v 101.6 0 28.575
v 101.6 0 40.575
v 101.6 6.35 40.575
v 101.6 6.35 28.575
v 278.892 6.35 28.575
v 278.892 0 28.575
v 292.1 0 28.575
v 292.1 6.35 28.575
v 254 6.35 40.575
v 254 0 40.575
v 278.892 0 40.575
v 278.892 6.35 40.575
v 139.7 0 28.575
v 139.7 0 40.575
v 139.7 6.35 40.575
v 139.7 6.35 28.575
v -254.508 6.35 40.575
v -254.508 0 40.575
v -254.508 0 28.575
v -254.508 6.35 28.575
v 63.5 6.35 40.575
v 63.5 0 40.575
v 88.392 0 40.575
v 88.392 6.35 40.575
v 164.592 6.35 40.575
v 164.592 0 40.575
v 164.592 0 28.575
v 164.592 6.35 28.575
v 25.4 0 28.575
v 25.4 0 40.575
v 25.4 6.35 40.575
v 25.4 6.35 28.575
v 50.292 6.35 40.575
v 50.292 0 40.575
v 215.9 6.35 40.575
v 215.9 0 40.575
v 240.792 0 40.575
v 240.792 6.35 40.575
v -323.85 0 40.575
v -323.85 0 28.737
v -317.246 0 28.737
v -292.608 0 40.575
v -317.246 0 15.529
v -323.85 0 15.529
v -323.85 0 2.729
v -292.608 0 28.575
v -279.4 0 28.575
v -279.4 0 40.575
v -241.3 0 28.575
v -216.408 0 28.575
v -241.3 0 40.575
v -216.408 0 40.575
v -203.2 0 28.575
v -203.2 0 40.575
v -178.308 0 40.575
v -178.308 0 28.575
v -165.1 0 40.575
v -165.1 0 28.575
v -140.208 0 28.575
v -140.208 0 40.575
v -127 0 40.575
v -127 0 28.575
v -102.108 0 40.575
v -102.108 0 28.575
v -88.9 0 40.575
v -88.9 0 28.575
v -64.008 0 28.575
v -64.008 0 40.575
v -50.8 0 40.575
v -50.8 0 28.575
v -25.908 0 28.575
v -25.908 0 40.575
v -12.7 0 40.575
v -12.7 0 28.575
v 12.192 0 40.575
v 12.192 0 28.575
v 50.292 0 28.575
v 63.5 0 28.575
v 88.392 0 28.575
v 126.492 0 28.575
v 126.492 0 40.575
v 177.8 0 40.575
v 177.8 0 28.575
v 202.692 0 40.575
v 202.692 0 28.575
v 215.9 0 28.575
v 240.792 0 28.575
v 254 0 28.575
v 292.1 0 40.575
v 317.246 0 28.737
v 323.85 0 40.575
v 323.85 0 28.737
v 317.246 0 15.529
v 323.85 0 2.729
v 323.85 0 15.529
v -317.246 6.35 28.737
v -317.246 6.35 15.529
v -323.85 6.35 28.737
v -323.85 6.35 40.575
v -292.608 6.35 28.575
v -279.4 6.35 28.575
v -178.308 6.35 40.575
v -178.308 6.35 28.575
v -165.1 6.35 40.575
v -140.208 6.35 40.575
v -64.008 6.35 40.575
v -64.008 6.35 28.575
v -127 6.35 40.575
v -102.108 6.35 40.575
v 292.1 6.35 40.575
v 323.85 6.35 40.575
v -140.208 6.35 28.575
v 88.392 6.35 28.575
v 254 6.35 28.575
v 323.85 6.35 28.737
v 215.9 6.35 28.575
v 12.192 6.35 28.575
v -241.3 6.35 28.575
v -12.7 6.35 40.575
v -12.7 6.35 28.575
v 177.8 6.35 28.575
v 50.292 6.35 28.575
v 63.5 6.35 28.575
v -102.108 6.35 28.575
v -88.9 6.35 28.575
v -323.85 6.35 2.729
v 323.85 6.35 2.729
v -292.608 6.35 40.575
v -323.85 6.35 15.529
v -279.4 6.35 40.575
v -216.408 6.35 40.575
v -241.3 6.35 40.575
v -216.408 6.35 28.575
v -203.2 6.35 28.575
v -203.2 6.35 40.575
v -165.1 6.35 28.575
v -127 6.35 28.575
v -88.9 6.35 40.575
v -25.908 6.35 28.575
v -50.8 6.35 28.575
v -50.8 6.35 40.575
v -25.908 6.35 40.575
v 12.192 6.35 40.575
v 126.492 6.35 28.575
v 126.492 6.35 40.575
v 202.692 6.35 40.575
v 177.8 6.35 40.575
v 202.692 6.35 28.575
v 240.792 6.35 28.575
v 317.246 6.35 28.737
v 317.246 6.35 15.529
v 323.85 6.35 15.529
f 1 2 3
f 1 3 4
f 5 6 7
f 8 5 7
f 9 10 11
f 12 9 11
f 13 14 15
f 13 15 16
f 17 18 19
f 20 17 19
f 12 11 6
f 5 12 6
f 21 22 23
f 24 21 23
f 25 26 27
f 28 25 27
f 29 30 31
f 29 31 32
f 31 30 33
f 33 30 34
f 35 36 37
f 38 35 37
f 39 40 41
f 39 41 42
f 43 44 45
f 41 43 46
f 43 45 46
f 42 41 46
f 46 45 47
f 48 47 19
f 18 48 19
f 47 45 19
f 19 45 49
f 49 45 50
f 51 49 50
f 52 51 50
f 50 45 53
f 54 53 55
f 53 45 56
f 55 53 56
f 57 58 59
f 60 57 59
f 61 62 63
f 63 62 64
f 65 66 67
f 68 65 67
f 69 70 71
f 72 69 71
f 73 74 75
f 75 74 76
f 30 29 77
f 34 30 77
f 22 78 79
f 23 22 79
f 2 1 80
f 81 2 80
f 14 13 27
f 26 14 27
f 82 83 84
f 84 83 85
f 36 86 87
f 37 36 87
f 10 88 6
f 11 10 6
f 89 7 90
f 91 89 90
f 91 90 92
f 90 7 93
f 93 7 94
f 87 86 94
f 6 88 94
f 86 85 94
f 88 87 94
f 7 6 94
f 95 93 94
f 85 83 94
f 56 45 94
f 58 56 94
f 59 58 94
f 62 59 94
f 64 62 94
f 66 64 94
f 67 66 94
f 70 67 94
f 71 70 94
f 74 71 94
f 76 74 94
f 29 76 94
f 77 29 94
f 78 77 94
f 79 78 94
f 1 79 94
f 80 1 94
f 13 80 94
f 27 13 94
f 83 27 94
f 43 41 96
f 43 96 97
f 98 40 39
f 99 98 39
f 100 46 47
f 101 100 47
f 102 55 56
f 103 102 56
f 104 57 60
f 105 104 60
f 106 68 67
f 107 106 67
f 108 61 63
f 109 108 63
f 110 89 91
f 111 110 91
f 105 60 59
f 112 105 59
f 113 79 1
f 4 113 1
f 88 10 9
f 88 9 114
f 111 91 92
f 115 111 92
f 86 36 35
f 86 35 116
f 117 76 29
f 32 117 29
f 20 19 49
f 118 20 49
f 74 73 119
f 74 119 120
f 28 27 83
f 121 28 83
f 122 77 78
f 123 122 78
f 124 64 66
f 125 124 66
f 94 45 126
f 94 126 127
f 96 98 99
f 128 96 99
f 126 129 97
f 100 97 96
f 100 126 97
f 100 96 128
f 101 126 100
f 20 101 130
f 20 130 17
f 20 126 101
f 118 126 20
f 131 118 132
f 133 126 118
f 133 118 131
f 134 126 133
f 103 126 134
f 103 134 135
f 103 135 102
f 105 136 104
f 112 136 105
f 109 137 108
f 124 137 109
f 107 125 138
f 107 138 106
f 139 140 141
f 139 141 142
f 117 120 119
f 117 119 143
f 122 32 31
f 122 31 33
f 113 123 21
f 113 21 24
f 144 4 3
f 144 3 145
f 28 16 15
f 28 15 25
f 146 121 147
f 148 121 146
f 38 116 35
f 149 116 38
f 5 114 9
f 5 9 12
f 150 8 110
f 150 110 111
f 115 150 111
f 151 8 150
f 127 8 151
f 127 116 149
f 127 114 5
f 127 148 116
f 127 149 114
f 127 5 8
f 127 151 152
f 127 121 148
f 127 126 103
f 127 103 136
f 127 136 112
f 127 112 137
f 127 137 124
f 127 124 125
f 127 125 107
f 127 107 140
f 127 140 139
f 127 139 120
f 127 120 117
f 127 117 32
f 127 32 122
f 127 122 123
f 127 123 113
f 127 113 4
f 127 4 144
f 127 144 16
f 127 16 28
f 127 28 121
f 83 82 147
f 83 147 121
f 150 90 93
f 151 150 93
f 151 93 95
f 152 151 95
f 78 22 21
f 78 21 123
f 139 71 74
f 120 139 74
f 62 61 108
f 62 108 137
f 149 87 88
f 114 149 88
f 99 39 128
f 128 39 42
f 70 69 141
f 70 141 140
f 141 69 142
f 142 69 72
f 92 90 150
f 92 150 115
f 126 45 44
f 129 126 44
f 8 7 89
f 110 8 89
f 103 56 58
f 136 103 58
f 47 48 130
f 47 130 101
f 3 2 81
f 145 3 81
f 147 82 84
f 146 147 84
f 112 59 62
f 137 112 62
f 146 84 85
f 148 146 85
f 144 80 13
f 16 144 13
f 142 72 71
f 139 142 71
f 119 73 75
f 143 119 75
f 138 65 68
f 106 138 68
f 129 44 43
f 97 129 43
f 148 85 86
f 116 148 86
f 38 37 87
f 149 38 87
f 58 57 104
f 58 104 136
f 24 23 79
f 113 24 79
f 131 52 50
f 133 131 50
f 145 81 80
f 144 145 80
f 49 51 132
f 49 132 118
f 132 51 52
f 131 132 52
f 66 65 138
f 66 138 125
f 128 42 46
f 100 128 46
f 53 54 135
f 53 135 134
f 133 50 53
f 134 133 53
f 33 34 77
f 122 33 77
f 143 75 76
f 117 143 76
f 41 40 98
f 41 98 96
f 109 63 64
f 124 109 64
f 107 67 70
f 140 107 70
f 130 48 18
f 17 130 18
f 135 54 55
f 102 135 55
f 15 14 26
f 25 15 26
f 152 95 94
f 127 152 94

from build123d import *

# Parameters (mm, degrees)
SKETCH1_W           = 647.7
SKETCH1_H           = 57.15
BOSS_EXTRUDE1_DEPTH = 6.35
SKETCH3_W           = 24.892
SKETCH3_H           = 12
BOSS_EXTRUDE2_DEPTH = 6.35
SKETCH4_W           = 13.208
SKETCH4_H           = 13.208
CUT_EXTRUDE2_DEPTH  = 327.443679101
SKETCH5_W           = 647.7
SKETCH5_H           = 6.35
CUT_EXTRUDE3_DEPTH  = 31.304


with BuildPart() as part:
    # Sketch1 → Boss-Extrude1 (new body)
    with BuildSketch(Plane(origin=(0, 0, 0), x_dir=(1, 0, 0), z_dir=(0, 1, 0))):
        Rectangle(SKETCH1_W, SKETCH1_H)
    extrude(amount=BOSS_EXTRUDE1_DEPTH)

    # Sketch3 → Boss-Extrude2 (add)
    with BuildSketch(Plane(origin=(0, 0, 0), x_dir=(1, 0, 0), z_dir=(0, 1, 0))):
        Polygon((-317.5, -40.575), (-292.608, -40.575), (-292.608, -28.575), (-317.5, -28.575), (-323.85, -28.575), (-323.85, -40.575), align=None)
        with Locations((-266.954, -34.575)):
            Rectangle(SKETCH3_W, SKETCH3_H)
        with Locations((-228.854, -34.575)):
            Rectangle(SKETCH3_W, SKETCH3_H)
        with Locations((-190.754, -34.575)):
            Rectangle(SKETCH3_W, SKETCH3_H)
        with Locations((-152.654, -34.575)):
            Rectangle(SKETCH3_W, SKETCH3_H)
        with Locations((-114.554, -34.575)):
            Rectangle(SKETCH3_W, SKETCH3_H)
        with Locations((-76.454, -34.575)):
            Rectangle(SKETCH3_W, SKETCH3_H)
        with Locations((-38.354, -34.575)):
            Rectangle(SKETCH3_W, SKETCH3_H)
        with Locations((-0.254, -34.575)):
            Rectangle(SKETCH3_W, SKETCH3_H)
        with Locations((37.846, -34.575)):
            Rectangle(SKETCH3_W, SKETCH3_H)
        with Locations((75.946, -34.575)):
            Rectangle(SKETCH3_W, SKETCH3_H)
        with Locations((114.046, -34.575)):
            Rectangle(SKETCH3_W, SKETCH3_H)
        with Locations((152.146, -34.575)):
            Rectangle(SKETCH3_W, SKETCH3_H)
        with Locations((190.246, -34.575)):
            Rectangle(SKETCH3_W, SKETCH3_H)
        with Locations((228.346, -34.575)):
            Rectangle(SKETCH3_W, SKETCH3_H)
        with Locations((266.446, -34.575)):
            Rectangle(SKETCH3_W, SKETCH3_H)
        Polygon((316.992, -28.575), (292.1, -28.575), (292.1, -40.575), (316.992, -40.575), (323.85, -40.575), (323.85, -28.575), align=None)
    extrude(amount=BOSS_EXTRUDE2_DEPTH)

    # Sketch4 → Cut-Extrude2 (cut, through all)
    with BuildSketch(Plane(origin=(0, 0, 0), x_dir=(1, 0, 0), z_dir=(0, 1, 0))):
        with Locations((-323.85, 3.875)):
            Rectangle(SKETCH4_W, SKETCH4_H)
        with Locations((-323.85, -22.133)):
            Rectangle(SKETCH4_W, SKETCH4_H)
        with Locations((323.85, -22.133)):
            Rectangle(SKETCH4_W, SKETCH4_H)
        with Locations((323.85, 3.875)):
            Rectangle(SKETCH4_W, SKETCH4_H)
        with Locations((-323.85, -48.141)):
            Rectangle(SKETCH4_W, SKETCH4_H)
        with Locations((323.85, -48.141)):
            Rectangle(SKETCH4_W, SKETCH4_H)
    extrude(amount=CUT_EXTRUDE2_DEPTH, mode=Mode.SUBTRACT)

    # Sketch5 → Cut-Extrude3 (cut)
    with BuildSketch(Plane(origin=(0, 0, -28.575), x_dir=(-1, 0, 0), z_dir=(0, 0, -1))):
        with Locations((0, 3.175)):
            Rectangle(SKETCH5_W, SKETCH5_H)
    extrude(amount=-CUT_EXTRUDE3_DEPTH, mode=Mode.SUBTRACT)


solid = part.part
